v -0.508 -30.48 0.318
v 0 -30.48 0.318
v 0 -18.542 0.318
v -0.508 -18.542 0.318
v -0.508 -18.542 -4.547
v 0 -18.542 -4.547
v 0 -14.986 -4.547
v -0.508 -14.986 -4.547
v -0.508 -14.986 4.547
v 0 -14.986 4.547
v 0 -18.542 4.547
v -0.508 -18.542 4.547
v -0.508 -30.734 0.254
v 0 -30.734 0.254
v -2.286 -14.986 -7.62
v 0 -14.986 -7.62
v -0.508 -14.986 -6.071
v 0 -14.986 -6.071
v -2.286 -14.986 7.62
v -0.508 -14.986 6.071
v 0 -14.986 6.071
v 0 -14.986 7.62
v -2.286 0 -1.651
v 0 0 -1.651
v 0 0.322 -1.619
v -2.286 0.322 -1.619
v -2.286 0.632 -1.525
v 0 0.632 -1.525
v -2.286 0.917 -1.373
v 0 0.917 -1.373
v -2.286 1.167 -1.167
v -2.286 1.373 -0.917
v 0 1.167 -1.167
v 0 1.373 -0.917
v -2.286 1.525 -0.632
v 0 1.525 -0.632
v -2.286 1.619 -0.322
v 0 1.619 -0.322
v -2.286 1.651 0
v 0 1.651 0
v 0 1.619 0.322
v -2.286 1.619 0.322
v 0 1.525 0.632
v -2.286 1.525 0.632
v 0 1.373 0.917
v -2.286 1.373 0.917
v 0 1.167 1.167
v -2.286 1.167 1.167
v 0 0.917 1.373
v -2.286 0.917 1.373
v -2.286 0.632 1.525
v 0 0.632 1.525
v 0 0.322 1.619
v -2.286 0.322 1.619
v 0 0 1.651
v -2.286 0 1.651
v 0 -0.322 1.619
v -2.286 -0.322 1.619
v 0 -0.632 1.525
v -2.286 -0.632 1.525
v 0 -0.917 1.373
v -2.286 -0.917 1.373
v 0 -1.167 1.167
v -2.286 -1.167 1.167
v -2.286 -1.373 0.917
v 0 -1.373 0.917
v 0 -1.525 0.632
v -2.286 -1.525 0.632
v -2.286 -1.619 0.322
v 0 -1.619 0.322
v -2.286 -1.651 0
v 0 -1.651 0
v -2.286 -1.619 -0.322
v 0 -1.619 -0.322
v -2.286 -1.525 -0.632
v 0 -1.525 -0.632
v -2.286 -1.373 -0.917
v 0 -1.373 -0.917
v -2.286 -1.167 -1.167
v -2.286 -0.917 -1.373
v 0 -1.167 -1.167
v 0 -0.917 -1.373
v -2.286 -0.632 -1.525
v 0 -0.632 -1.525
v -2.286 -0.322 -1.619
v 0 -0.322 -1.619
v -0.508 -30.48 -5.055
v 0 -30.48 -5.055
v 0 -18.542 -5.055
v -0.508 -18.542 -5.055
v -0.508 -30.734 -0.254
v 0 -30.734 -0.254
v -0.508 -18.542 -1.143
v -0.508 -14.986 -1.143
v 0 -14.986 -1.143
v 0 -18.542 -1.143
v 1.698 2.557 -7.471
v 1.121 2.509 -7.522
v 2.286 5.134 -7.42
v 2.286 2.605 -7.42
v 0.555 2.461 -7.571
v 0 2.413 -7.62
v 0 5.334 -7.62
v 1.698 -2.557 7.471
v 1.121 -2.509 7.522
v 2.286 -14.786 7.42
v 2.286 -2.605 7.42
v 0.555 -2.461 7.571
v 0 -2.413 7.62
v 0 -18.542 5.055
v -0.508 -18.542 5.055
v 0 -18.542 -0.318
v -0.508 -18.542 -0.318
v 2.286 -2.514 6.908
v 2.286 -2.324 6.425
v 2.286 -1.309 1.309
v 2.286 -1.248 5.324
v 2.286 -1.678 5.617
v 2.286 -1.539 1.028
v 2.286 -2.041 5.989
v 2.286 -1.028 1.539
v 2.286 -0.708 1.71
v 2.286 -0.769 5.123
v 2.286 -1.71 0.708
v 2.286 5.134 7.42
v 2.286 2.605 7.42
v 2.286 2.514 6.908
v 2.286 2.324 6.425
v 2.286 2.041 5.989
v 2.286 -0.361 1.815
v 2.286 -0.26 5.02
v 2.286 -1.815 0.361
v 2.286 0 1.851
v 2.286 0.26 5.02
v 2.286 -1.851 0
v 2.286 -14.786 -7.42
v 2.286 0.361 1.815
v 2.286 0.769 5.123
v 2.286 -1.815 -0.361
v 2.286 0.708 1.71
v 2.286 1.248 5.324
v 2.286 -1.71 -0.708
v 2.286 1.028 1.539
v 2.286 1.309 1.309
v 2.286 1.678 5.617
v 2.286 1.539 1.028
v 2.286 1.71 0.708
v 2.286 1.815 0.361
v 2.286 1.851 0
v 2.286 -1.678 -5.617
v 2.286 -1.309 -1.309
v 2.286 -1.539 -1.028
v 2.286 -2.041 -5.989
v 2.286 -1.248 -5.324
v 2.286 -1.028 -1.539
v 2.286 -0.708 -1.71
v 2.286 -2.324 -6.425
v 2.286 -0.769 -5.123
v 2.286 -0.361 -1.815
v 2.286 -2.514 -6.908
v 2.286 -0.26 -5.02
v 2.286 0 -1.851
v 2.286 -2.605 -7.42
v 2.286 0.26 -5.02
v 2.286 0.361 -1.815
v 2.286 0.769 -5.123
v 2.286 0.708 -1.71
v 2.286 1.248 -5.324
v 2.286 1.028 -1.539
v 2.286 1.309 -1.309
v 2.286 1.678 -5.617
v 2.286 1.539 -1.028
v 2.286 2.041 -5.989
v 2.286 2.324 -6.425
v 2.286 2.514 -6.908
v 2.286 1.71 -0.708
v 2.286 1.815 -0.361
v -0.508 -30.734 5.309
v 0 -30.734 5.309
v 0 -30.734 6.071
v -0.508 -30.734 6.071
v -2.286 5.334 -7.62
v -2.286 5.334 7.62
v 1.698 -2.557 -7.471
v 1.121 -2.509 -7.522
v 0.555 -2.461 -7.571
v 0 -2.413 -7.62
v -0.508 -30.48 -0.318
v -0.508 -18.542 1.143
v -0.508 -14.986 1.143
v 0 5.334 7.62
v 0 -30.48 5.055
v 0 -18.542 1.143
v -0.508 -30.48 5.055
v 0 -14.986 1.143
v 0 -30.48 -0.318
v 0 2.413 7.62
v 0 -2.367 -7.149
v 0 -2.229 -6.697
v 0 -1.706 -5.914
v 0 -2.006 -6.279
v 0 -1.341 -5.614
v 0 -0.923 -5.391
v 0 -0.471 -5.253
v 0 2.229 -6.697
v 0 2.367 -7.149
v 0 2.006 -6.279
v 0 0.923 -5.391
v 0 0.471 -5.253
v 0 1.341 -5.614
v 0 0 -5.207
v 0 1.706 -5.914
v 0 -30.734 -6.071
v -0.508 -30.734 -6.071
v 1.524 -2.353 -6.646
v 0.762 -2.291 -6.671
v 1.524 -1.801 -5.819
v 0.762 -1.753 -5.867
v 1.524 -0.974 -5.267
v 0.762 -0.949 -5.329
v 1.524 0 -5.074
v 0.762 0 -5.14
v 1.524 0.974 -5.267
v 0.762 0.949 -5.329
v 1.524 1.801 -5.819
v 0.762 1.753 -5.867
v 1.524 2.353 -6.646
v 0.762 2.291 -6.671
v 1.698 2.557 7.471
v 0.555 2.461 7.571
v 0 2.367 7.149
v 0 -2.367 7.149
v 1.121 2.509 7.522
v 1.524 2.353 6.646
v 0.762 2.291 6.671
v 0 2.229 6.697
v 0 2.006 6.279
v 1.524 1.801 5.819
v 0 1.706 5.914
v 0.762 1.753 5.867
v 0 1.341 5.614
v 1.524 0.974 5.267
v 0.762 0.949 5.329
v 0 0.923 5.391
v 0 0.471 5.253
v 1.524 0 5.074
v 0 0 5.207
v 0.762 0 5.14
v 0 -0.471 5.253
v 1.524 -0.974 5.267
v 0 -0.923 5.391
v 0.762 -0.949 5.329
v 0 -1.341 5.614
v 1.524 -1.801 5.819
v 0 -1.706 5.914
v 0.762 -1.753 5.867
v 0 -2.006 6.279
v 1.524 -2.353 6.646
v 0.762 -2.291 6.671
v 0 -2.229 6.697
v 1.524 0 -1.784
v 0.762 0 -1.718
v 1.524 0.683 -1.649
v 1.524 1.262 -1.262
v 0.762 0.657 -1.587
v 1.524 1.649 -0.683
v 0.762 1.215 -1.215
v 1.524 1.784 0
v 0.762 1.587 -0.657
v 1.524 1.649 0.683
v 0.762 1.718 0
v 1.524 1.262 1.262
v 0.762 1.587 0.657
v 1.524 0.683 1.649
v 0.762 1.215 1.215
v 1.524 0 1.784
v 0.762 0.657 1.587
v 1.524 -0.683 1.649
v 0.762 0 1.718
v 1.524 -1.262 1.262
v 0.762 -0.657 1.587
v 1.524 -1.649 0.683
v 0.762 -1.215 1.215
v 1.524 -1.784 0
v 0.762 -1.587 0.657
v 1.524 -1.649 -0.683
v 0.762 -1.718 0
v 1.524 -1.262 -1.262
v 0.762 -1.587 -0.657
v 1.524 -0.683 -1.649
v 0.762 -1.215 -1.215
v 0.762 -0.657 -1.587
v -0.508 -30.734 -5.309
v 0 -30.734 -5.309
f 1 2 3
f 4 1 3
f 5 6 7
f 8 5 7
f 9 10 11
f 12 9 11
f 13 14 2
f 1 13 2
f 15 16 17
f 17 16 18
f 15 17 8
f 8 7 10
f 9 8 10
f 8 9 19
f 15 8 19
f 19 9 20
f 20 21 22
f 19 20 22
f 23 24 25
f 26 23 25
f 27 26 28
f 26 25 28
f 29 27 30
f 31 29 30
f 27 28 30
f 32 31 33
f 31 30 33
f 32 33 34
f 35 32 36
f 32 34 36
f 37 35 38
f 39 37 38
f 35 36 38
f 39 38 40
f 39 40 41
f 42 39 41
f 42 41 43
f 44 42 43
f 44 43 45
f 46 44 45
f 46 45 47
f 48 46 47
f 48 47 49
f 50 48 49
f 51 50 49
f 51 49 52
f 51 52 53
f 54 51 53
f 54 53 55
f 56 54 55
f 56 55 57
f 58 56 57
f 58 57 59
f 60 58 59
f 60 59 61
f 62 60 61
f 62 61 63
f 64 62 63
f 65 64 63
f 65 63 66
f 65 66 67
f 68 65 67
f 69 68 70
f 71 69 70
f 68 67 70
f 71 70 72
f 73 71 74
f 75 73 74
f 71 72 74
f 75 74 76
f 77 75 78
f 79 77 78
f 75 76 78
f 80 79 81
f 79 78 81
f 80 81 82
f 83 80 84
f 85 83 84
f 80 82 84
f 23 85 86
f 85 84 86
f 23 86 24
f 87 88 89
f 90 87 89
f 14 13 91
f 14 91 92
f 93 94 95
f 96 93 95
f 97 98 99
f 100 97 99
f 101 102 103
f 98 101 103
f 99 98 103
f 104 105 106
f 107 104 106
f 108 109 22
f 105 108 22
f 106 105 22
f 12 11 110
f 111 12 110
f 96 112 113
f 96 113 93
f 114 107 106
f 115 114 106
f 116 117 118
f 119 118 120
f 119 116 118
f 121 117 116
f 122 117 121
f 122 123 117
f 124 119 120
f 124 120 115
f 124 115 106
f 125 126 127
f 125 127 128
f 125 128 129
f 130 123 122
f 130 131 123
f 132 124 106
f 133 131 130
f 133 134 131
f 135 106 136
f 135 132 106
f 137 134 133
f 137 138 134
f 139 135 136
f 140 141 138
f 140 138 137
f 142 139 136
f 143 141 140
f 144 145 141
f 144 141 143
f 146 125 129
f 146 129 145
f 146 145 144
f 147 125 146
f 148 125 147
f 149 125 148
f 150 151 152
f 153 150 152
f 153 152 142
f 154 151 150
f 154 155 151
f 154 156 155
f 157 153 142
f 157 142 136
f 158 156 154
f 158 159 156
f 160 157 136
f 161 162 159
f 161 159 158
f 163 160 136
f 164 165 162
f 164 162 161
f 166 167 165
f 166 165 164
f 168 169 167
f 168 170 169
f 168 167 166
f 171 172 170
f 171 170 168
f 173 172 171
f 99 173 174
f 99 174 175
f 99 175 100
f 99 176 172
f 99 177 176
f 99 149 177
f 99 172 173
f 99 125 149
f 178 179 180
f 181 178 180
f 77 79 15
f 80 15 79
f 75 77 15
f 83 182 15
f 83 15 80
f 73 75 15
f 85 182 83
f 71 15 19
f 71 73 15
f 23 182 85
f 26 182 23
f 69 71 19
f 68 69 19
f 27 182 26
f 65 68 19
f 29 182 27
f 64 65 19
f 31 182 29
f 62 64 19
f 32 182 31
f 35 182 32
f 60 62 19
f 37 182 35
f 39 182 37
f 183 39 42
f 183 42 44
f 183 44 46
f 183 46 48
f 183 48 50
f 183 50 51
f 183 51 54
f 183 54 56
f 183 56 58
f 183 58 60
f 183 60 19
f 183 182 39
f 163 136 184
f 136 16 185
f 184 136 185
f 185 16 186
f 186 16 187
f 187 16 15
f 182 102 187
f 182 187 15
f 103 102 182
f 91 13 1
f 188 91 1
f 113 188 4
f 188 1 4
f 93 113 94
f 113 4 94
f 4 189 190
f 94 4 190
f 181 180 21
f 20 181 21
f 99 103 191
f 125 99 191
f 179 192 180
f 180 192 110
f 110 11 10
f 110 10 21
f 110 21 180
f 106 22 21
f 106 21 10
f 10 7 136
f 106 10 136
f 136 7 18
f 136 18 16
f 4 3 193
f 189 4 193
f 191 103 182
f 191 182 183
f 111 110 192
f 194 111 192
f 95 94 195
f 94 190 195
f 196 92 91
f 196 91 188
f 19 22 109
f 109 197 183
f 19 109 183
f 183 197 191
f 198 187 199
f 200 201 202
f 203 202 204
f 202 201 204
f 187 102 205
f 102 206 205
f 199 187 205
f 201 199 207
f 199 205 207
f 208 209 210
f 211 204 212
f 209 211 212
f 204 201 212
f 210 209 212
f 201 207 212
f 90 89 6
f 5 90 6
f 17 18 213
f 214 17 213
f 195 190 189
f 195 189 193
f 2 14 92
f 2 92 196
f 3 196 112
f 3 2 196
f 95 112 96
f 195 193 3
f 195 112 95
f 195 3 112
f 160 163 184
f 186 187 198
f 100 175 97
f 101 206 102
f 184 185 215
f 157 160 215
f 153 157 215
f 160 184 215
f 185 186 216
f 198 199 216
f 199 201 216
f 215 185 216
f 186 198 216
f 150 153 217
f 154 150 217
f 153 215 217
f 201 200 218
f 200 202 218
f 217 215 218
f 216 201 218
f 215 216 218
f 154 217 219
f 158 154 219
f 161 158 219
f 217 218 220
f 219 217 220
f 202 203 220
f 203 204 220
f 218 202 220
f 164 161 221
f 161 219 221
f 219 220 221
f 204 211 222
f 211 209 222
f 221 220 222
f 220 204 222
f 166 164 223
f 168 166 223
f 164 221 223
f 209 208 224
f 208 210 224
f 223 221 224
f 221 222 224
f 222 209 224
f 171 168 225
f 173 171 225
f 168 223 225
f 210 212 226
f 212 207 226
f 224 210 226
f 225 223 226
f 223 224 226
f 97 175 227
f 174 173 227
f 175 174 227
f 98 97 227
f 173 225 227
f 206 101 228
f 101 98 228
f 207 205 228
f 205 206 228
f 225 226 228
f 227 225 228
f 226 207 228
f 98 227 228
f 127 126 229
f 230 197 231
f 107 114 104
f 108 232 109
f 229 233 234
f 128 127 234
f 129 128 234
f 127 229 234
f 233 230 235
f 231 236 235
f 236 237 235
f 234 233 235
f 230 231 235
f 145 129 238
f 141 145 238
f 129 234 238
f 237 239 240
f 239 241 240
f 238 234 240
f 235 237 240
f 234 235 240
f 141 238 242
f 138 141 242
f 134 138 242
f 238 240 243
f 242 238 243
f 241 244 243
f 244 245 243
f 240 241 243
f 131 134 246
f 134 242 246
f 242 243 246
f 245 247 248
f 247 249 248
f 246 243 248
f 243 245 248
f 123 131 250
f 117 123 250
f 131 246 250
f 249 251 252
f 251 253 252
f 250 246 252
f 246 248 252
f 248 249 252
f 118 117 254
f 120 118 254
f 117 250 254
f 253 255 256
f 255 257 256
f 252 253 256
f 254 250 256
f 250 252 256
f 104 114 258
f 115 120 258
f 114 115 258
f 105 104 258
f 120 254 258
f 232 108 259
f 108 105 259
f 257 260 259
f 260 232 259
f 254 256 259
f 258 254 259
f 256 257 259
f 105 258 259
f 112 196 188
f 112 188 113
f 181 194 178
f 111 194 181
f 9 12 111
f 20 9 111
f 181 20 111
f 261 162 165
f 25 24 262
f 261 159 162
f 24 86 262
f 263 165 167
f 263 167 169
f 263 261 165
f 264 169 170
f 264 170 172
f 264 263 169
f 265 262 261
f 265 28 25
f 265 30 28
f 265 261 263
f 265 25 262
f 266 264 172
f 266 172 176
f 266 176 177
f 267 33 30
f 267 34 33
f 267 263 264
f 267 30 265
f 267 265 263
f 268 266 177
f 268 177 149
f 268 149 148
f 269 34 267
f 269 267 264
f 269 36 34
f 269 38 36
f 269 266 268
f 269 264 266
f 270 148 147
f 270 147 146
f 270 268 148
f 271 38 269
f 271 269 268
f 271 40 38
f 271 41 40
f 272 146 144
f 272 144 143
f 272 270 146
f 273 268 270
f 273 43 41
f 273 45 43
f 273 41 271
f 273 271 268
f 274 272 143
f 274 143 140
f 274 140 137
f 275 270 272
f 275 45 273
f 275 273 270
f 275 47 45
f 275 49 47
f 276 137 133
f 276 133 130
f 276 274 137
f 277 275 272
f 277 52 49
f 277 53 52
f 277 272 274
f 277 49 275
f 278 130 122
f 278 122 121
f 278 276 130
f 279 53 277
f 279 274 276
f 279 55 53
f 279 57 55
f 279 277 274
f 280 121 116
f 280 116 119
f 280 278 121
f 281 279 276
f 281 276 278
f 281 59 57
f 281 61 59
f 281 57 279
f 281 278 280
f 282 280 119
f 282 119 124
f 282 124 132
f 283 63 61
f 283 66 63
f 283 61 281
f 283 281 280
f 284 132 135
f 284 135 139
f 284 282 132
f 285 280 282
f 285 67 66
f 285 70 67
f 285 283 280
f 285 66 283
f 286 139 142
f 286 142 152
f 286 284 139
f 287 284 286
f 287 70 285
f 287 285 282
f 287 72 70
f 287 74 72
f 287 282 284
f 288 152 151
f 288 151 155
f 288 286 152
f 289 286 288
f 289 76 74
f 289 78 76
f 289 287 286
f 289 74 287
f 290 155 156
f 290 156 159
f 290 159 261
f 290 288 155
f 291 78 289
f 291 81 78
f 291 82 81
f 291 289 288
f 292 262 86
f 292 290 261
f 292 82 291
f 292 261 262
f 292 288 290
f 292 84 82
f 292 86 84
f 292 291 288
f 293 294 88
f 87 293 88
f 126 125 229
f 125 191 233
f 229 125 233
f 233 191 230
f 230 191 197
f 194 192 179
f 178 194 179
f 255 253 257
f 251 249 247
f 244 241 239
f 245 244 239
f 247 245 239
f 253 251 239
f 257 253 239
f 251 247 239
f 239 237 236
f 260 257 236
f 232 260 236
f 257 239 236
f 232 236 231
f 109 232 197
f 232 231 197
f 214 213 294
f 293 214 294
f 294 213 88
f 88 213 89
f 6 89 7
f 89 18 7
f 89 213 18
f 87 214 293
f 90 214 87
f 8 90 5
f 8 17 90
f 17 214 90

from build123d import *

# Parameters (mm, degrees)
EXTRUDE1_DEPTH     = 2.286
EXTRUDE1_DRAFT     = 5
SKETCH6_W          = 15.24
SKETCH6_H          = 20.32
EXTRUDE2_DEPTH     = 2.286
SKETCH7_R          = 1.651
CUT_EXTRUDE3_DEPTH = 18.42262265
SKETCH9_R          = 1.651
CUT_EXTRUDE6_DEPTH = 2.286
CUT_EXTRUDE6_DRAFT = -5
SKETCH10_W         = 0.508
SKETCH10_H         = 15.748
BASE_FLANGE1_DEPTH = 1.143
CUT_EXTRUDE8_DEPTH = 32.746951854
EXTRUDE3_DEPTH     = 0.508


# Sheet-metal steps are written as plain solids
with BuildPart() as part:
    # Sketch2 → Extrude1 (with draft: the straight prism first)
    with BuildSketch(Plane(origin=(0, 0, 0), x_dir=(0, 0, -1), z_dir=(1, 0, 0))):
        with BuildLine():
            ThreePointArc((7.62, -2.413), (5.207, 0), (7.62, 2.413))
            Line((7.62, 2.413), (7.62, 5.334))
            Line((7.62, 5.334), (-7.62, 5.334))
            Line((-7.62, 5.334), (-7.62, 2.413))
            ThreePointArc((-7.62, 2.413), (-5.207, 0), (-7.62, -2.413))
            Line((-7.62, -2.413), (-7.62, -14.986))
            Line((-7.62, -14.986), (7.62, -14.986))
            Line((7.62, -14.986), (7.62, -2.413))
        make_face()
    extrude(amount=EXTRUDE1_DEPTH)
    # Extrude1: the draft: its side faces are tilted about the plane it starts from
    extrude1_sides = [part.faces().sort_by_distance(p)[0] for p in [
        (1.143, 0, -5.207),
        (1.143, 3.8735, -7.62),
        (1.143, 5.334, 0),
        (1.143, 3.8735, 7.62),
        (1.143, 0, 5.207),
        (1.143, -8.6995, 7.62),
        (1.143, -14.986, 0),
        (1.143, -8.6995, -7.62),
    ]]
    draft(extrude1_sides, Plane(origin=(0, 0, 0), x_dir=(0, 0, -1), z_dir=(1, 0, 0)), EXTRUDE1_DRAFT)

    # Sketch6 → Extrude2 (add)
    with BuildSketch(Plane.ZY):
        with Locations((0, -4.826)):
            Rectangle(SKETCH6_W, SKETCH6_H)
    extrude(amount=EXTRUDE2_DEPTH)

    # Sketch7 → Cut-Extrude3 (cut, through all)
    with BuildSketch(Plane(origin=(2.286, 0, 0), x_dir=(0, 0, -1), z_dir=(1, 0, 0))):
        Circle(SKETCH7_R)
    extrude(amount=-CUT_EXTRUDE3_DEPTH, mode=Mode.SUBTRACT)


with BuildPart() as cut_extrude6_tool:
    # Sketch9 → Cut-Extrude6 (with draft: the straight prism first)
    with BuildSketch(Plane(origin=(0, 0, 0), x_dir=(0, 0, -1), z_dir=(1, 0, 0))):
        Circle(SKETCH9_R)
    extrude(amount=CUT_EXTRUDE6_DEPTH)
    # Cut-Extrude6: the draft: its side faces are tilted about the plane it starts from
    cut_extrude6_sides = [cut_extrude6_tool.faces().sort_by_distance(p)[0] for p in [
        (1.143, 0, 1.651),
    ]]
    draft(cut_extrude6_sides, Plane(origin=(0, 0, 0), x_dir=(0, 0, -1), z_dir=(1, 0, 0)), CUT_EXTRUDE6_DRAFT)


with BuildPart() as part_1:
    add(part.part)

    # Cut-Extrude6: cut by cut_extrude6_tool
    add(cut_extrude6_tool.part, mode=Mode.SUBTRACT)

    # Sketch15 → Extrude3 (add)
    with BuildSketch(Plane(origin=(0, 0, 0), x_dir=(0, 0, -1), z_dir=(1, 0, 0))):
        Polygon((-6.0706, -14.986), (-4.5466, -14.986), (-4.5466, -18.542), (-5.0546, -18.542), (-5.0546, -30.48), (-5.3086, -30.734), (-6.0706, -30.734), align=None)
        Polygon((5.0546, -30.48), (5.0546, -18.542), (4.5466, -18.542), (4.5466, -14.986), (6.0706, -14.986), (6.0706, -30.734), (5.3086, -30.734), align=None)
    extrude(amount=-EXTRUDE3_DEPTH)


with BuildPart() as body_2:
    # Sketch10 → Base-Flange1 (new, symmetric)
    with BuildSketch(Plane.XY):
        with Locations((-0.254, -22.86)):
            Rectangle(SKETCH10_W, SKETCH10_H)
    extrude(amount=BASE_FLANGE1_DEPTH, both=True)

    # Sketch13 → Cut-Extrude8 (cut, through all)
    with BuildSketch(Plane(origin=(0, 0, 0), x_dir=(0, 0, -1), z_dir=(1, 0, 0))):
        Polygon((-1.143, -30.734), (-0.254, -30.734), (-0.3175, -30.48), (-0.3175, -18.542), (-1.143, -18.542), align=None)
        Polygon((0.254, -30.734), (0.3175, -30.48), (0.3175, -18.542), (1.143, -18.542), (1.143, -30.734), align=None)
    extrude(amount=-CUT_EXTRUDE8_DEPTH, mode=Mode.SUBTRACT)


solid = Compound([part_1.part, body_2.part])
